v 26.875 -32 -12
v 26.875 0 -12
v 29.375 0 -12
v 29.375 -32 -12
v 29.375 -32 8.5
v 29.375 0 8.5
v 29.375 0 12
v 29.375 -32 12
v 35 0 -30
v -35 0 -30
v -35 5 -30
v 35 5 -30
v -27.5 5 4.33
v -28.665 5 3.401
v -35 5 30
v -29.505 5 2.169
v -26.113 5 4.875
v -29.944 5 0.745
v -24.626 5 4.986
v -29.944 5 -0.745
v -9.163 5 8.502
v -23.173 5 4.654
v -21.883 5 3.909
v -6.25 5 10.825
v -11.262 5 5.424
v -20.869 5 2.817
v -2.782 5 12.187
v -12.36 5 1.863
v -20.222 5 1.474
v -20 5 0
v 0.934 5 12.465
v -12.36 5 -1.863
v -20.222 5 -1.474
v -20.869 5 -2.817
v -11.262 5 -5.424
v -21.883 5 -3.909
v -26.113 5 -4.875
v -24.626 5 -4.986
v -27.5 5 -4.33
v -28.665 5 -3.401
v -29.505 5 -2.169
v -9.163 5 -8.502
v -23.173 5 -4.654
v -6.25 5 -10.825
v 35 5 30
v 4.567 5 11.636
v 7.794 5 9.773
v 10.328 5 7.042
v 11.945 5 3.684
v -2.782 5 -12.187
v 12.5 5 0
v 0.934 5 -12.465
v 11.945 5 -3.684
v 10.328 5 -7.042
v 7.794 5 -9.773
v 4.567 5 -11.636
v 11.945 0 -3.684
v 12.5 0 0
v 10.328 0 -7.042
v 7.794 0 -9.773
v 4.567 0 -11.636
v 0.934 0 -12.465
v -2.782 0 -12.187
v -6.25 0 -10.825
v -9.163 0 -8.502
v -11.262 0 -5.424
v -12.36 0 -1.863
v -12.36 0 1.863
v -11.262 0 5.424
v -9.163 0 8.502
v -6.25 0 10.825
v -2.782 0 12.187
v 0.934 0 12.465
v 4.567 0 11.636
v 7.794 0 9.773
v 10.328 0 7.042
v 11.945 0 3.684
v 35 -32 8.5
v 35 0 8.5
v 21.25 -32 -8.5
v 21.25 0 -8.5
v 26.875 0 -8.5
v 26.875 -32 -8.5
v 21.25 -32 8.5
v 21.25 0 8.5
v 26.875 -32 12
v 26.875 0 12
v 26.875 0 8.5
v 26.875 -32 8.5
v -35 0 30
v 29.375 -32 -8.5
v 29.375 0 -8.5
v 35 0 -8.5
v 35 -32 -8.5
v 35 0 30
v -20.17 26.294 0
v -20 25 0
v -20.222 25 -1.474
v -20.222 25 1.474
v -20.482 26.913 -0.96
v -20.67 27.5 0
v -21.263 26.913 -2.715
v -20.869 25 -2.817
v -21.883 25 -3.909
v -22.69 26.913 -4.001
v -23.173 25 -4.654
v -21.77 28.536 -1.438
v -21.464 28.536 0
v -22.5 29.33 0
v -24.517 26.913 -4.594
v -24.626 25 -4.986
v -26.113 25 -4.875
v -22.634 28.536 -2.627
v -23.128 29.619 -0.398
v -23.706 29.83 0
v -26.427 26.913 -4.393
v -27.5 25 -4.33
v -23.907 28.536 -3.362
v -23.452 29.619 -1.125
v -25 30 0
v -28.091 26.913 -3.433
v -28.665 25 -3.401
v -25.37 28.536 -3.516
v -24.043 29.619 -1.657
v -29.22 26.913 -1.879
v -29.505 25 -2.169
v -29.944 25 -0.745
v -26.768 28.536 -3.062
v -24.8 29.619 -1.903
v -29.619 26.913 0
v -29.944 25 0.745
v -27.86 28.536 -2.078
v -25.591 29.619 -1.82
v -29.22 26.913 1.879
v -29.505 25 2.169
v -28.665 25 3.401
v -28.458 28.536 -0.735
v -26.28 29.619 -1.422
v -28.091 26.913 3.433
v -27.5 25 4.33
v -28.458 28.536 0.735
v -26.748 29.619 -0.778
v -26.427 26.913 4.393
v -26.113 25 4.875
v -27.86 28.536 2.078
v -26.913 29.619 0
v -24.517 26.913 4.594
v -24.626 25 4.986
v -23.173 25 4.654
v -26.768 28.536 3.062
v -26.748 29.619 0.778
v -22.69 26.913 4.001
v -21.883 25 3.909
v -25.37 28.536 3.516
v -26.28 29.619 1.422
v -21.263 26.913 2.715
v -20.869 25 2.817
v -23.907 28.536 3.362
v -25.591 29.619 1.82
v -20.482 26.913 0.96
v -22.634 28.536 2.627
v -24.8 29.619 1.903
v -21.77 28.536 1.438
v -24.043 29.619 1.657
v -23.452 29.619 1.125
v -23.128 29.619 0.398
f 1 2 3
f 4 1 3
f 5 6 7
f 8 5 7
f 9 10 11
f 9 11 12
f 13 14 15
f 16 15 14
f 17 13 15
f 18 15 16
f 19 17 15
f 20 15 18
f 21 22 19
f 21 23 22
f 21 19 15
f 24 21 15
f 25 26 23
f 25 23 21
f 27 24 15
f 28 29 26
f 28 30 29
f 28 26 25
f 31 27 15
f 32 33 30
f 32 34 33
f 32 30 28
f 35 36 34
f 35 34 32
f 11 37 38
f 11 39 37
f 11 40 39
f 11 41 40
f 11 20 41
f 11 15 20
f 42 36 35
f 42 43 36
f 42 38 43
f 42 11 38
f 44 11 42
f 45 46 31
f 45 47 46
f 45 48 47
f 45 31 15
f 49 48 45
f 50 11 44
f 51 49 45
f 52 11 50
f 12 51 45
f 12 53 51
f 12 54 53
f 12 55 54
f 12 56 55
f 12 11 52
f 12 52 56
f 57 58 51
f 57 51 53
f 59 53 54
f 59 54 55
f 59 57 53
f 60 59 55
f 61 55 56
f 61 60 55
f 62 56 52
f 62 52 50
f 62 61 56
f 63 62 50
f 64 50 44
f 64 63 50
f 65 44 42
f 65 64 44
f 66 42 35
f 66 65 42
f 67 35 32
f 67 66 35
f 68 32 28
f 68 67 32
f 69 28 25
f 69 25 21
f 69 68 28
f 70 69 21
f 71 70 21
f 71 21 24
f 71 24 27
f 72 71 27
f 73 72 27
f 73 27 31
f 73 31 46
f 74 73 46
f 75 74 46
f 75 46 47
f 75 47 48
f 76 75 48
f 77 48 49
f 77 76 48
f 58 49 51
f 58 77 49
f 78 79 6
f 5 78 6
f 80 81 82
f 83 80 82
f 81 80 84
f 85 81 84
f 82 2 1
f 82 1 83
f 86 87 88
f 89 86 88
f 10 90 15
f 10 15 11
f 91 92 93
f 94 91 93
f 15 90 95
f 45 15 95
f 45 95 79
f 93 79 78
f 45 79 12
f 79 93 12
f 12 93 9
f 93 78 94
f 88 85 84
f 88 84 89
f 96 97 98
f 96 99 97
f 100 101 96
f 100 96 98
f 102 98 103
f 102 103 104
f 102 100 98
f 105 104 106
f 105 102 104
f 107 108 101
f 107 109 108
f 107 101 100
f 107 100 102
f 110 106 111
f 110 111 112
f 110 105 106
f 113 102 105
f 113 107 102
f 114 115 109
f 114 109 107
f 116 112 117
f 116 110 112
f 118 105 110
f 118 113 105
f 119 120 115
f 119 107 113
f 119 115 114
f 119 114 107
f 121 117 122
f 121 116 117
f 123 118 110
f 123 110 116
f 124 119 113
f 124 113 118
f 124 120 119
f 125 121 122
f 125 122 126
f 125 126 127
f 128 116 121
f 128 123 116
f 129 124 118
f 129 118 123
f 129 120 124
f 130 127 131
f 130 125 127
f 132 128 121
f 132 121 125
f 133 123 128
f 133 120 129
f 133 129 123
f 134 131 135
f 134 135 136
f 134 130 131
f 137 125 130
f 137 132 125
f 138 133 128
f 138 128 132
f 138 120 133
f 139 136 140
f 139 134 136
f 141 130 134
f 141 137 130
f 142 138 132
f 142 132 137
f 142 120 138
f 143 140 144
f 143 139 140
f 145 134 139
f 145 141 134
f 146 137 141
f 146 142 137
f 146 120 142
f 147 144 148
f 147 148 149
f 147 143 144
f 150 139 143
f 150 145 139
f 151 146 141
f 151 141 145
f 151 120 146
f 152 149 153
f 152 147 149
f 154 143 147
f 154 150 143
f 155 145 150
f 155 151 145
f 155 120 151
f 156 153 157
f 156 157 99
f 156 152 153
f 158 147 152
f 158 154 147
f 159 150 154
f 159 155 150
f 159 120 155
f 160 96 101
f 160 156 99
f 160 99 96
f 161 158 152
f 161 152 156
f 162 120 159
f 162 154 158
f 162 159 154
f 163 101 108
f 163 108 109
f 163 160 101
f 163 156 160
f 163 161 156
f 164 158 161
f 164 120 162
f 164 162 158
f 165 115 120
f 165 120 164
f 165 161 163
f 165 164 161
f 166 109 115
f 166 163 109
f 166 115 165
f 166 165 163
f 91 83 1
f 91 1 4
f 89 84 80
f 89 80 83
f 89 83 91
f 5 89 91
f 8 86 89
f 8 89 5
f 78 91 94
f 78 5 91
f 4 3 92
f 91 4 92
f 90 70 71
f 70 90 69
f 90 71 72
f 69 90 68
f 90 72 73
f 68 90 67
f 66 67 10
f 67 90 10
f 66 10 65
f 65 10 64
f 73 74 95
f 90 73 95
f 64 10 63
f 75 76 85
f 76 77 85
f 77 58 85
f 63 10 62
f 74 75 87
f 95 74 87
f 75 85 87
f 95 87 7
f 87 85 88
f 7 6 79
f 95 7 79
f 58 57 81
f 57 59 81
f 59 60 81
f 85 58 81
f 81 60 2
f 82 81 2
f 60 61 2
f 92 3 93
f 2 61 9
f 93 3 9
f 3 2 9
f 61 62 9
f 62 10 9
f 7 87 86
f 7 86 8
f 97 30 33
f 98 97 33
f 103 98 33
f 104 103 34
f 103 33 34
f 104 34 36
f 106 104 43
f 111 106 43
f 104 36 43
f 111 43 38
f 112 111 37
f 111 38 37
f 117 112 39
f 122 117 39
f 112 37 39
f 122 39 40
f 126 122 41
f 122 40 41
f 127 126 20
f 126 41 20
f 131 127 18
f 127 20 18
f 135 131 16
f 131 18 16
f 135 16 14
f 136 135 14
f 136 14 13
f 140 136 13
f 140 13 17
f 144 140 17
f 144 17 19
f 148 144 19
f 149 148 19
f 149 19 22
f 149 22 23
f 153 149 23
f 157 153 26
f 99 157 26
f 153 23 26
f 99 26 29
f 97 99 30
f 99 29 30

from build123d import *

# Parameters (mm, degrees)
CROQUIS1_W              = 70
CROQUIS1_H              = 60
CROQUIS1_R              = 12.5
SALIENTE_EXTRUIR1_DEPTH = 5
CROQUIS2_W              = 5.625
CROQUIS2_H              = 17
CROQUIS2_W_2            = 2.5
CROQUIS2_H_2            = 3.5
SALIENTE_EXTRUIR2_DEPTH = 32
CROQUIS3_R              = 5
SALIENTE_EXTRUIR3_DEPTH = 25
REDONDEO1_R             = 5


with BuildPart() as part:
    # Croquis1 → Saliente-Extruir1 (new body)
    with BuildSketch(Plane(origin=(0, 0, 0), x_dir=(1, 0, 0), z_dir=(0, 1, 0))):
        Rectangle(CROQUIS1_W, CROQUIS1_H)
        Circle(CROQUIS1_R, mode=Mode.SUBTRACT)
    extrude(amount=SALIENTE_EXTRUIR1_DEPTH)

    # Croquis2 → Saliente-Extruir2 (add)
    with BuildSketch(Plane.XZ):
        with Locations((32.1875, 0)):
            Rectangle(CROQUIS2_W, CROQUIS2_H)
        with Locations((28.125, 0)):
            Rectangle(CROQUIS2_W_2, CROQUIS2_H)
        with Locations((28.125, 10.25)):
            Rectangle(CROQUIS2_W_2, CROQUIS2_H_2)
        with Locations((24.0625, 0)):
            Rectangle(CROQUIS2_W, CROQUIS2_H)
        with Locations((28.125, -10.25)):
            Rectangle(CROQUIS2_W_2, CROQUIS2_H_2)
    extrude(amount=SALIENTE_EXTRUIR2_DEPTH)

    # Croquis3 → Saliente-Extruir3 (add)
    with BuildSketch(Plane(origin=(0, 5, 0), x_dir=(1, 0, 0), z_dir=(0, 1, 0))):
        with Locations((-25, 0)):
            Circle(CROQUIS3_R)
    extrude(amount=SALIENTE_EXTRUIR3_DEPTH)

    # Redondeo1
    redondeo1_edges = [part.edges().sort_by_distance(p)[0] for p in [
        (-30, 30, 0),
    ]]
    fillet(redondeo1_edges, radius=REDONDEO1_R)


solid = part.part
